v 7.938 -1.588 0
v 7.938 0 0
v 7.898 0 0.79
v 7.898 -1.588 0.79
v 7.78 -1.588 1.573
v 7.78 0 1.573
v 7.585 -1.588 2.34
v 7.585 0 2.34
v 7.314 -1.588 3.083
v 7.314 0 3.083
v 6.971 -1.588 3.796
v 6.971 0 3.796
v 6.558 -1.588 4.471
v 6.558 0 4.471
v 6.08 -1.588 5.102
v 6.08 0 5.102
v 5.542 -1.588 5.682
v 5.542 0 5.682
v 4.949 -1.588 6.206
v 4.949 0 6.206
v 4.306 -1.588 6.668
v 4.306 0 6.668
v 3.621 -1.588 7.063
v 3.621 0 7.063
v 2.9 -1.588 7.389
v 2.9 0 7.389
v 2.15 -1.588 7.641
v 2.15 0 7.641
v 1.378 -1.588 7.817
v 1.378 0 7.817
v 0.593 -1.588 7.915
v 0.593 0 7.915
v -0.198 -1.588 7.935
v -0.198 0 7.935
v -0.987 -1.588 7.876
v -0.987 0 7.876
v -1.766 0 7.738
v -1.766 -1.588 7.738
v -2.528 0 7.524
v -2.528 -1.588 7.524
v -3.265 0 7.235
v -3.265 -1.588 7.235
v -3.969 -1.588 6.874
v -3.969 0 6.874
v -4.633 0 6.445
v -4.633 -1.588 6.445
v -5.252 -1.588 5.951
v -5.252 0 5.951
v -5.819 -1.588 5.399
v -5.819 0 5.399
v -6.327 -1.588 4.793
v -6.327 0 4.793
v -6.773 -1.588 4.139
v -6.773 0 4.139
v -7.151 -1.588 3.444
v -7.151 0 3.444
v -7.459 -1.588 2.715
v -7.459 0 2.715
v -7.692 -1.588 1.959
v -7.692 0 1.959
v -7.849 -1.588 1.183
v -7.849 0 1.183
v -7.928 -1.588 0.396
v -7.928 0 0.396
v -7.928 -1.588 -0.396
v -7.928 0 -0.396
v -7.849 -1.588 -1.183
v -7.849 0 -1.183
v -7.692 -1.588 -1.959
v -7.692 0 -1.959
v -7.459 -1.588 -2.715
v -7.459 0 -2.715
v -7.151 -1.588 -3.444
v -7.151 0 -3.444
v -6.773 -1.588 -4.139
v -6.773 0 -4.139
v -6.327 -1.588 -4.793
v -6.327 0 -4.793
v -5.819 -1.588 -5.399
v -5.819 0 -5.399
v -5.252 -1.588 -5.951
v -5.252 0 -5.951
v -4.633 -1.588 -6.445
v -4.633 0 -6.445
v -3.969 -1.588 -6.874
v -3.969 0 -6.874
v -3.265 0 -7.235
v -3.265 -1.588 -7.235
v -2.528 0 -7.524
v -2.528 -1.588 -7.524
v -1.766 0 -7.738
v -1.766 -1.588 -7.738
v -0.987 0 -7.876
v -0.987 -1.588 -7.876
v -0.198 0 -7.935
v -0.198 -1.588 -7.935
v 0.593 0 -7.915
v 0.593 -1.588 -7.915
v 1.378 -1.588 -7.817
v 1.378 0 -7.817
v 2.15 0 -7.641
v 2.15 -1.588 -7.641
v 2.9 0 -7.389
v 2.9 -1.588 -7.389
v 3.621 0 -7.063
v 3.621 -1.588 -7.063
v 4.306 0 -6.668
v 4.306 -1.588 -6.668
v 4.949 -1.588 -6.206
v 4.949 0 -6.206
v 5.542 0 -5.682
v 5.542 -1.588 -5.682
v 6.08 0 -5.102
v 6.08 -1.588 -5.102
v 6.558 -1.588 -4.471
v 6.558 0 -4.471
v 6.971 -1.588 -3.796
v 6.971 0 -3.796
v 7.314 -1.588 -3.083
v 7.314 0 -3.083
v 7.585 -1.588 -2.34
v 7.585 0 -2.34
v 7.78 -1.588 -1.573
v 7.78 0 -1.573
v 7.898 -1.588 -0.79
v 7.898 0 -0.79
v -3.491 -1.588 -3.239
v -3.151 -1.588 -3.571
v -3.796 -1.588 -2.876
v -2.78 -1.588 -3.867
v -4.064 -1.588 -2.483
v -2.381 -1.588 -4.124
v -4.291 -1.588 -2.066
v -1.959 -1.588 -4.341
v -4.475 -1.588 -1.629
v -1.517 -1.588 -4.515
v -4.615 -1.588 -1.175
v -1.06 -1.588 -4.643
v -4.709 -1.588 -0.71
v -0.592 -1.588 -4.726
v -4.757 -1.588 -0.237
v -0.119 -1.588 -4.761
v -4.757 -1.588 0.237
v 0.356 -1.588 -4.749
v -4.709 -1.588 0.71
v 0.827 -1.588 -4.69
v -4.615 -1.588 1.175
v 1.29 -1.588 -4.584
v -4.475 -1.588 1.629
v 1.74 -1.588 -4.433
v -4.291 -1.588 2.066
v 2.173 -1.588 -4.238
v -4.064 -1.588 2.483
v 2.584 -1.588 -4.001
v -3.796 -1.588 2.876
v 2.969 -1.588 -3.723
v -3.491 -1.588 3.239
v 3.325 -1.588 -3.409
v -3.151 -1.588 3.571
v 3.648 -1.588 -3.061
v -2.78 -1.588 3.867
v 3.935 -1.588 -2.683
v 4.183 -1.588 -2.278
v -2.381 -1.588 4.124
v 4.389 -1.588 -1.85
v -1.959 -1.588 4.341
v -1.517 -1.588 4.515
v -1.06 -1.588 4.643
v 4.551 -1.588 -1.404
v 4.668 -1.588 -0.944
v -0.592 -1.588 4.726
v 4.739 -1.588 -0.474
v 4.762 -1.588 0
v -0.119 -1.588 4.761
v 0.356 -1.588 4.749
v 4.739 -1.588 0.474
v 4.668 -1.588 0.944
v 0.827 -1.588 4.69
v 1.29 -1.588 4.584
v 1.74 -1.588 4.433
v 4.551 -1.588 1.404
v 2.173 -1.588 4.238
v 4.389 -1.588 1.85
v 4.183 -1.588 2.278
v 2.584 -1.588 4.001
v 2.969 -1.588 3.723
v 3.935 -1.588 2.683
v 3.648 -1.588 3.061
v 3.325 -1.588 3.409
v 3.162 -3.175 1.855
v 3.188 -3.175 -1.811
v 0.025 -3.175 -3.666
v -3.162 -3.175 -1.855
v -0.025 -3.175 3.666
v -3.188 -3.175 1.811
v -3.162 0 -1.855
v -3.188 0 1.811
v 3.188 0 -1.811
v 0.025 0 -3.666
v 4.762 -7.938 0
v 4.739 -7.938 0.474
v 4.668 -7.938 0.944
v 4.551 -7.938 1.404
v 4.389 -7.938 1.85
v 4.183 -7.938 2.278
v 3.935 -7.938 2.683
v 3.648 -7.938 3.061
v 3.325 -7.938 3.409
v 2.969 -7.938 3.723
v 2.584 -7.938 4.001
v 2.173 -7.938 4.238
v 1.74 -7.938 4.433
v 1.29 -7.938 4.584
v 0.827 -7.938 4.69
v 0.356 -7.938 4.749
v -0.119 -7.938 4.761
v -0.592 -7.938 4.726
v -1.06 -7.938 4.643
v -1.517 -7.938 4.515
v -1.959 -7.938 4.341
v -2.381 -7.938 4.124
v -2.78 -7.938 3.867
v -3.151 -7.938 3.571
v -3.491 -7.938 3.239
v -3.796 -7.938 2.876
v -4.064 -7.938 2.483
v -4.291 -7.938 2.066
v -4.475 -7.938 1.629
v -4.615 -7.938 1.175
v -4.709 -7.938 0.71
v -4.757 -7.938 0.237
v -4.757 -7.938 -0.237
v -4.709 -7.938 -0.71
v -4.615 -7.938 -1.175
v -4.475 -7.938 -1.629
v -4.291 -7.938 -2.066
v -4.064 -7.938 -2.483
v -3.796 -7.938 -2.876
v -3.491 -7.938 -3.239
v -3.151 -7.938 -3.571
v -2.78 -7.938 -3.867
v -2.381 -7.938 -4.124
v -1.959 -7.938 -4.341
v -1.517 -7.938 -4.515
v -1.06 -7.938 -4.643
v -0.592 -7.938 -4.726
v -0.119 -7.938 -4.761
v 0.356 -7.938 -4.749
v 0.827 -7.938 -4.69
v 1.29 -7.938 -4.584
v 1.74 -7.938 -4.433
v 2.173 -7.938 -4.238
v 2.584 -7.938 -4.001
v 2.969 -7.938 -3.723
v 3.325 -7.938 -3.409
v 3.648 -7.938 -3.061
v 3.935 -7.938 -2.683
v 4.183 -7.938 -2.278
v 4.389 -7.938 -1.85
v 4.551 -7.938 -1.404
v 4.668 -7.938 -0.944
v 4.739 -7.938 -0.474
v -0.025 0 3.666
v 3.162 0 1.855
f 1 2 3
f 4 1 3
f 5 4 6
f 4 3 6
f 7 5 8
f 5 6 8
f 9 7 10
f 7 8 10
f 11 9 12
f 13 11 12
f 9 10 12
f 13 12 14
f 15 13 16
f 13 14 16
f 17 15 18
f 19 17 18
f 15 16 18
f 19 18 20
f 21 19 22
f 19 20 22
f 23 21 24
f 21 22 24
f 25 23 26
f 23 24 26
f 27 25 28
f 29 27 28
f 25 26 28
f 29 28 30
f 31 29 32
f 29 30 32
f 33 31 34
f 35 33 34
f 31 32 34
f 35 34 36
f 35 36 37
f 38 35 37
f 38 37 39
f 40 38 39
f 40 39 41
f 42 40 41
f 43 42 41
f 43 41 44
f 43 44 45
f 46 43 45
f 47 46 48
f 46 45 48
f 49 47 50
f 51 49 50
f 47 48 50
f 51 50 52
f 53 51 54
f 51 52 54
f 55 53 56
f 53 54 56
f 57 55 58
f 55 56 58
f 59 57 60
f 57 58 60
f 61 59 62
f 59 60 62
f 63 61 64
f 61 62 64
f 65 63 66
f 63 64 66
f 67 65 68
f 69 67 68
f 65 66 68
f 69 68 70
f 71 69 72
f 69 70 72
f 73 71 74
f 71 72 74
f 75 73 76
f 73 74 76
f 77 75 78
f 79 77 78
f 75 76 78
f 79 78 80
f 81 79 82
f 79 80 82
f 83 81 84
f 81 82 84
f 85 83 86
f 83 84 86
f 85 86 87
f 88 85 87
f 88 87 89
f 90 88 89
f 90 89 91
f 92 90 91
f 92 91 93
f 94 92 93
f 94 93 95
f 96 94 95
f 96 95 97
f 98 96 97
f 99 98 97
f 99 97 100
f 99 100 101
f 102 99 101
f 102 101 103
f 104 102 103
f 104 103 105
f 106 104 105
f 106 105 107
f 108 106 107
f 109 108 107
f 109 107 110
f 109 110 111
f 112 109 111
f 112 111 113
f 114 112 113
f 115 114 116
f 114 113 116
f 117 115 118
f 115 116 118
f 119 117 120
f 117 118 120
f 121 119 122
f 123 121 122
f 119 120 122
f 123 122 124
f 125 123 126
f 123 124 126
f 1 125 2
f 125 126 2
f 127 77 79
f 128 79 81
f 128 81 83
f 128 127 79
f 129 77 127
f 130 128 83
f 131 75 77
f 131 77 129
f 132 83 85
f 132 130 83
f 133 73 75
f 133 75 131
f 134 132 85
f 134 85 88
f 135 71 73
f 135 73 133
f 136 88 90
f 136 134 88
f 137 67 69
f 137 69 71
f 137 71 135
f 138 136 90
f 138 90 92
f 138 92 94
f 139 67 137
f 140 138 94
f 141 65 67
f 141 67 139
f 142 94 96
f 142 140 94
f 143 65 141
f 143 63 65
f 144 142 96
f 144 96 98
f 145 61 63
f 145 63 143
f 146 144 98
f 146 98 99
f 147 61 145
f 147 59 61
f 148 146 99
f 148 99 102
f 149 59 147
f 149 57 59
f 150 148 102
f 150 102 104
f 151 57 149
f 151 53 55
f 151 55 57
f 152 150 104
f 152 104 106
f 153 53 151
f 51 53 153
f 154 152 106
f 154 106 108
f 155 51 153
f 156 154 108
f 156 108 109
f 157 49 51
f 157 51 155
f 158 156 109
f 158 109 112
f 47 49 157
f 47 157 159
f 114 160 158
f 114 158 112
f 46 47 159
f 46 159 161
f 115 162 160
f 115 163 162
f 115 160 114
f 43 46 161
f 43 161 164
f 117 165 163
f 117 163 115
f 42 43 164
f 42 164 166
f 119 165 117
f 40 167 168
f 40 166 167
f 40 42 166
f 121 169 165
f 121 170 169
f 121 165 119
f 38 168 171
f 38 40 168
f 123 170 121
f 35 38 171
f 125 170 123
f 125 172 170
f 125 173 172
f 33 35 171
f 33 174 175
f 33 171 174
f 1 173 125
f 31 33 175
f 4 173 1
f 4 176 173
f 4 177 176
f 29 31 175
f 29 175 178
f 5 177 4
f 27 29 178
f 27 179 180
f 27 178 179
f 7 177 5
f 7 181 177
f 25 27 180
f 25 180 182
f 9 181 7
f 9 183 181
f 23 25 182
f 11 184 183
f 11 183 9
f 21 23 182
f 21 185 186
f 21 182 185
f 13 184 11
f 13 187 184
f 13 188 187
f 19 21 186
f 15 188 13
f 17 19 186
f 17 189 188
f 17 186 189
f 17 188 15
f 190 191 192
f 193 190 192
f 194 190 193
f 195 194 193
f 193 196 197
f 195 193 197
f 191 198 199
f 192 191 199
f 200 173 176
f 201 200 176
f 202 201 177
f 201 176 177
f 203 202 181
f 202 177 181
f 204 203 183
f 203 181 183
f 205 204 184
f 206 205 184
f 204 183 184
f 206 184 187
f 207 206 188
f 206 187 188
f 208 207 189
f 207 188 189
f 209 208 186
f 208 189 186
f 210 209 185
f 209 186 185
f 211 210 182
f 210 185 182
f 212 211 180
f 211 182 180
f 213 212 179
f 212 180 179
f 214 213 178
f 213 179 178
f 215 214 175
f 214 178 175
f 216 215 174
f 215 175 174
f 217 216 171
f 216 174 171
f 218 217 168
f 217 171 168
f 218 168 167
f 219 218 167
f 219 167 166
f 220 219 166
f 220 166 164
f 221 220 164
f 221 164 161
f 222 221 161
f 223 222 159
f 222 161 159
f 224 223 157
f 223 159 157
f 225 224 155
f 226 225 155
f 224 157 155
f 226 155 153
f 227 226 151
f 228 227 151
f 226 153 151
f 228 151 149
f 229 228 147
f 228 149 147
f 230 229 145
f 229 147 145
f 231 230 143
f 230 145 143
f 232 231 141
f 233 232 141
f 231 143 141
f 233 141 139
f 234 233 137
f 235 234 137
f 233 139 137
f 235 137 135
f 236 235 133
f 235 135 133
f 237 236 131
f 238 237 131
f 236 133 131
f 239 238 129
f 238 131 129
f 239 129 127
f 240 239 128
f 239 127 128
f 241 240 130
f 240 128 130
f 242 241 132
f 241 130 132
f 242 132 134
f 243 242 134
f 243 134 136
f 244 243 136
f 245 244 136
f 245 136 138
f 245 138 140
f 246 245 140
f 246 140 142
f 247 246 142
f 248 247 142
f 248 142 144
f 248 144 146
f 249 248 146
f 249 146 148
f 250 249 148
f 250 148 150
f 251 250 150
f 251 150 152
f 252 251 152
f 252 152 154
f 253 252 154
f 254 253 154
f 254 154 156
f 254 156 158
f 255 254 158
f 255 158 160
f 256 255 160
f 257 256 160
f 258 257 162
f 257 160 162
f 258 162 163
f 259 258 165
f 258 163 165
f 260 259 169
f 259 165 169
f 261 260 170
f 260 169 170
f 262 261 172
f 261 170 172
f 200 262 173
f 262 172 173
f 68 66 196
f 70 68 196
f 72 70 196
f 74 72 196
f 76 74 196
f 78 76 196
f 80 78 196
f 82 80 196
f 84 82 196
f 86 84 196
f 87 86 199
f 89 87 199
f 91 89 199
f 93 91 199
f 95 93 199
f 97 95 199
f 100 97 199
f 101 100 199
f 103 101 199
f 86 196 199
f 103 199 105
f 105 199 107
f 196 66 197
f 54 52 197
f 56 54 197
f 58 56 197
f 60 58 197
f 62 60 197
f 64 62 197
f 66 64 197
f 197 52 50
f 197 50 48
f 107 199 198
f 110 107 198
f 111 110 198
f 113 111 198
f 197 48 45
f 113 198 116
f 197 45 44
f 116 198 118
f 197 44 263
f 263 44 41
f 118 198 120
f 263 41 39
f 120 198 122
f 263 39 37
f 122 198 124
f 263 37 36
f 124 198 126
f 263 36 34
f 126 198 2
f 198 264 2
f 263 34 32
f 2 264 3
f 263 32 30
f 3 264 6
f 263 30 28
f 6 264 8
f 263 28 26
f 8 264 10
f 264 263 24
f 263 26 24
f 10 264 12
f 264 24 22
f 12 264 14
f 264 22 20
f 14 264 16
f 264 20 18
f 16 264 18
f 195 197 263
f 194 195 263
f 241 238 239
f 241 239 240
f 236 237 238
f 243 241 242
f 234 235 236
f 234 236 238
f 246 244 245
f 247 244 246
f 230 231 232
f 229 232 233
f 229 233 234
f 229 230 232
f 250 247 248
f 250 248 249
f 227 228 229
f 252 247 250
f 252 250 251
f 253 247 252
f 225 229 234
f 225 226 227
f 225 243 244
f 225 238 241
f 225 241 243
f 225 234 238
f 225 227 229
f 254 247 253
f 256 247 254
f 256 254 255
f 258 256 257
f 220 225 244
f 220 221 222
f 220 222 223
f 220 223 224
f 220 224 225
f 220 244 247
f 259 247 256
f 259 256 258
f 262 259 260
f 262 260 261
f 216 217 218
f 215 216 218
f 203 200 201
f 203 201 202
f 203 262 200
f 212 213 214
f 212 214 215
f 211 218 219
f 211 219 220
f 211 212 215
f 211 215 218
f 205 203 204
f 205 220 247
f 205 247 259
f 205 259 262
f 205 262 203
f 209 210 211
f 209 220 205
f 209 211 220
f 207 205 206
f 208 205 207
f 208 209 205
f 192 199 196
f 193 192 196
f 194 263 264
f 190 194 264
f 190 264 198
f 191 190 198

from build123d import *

# Parameters (mm, degrees)
F0_R     = 7.9375
F1_DEPTH = 1.5875
F2_R     = 4.7625
F3_DEPTH = 6.35
F5_DEPTH = 3.175


with BuildPart() as f1:
    # F0 (on Front) → F1 (new body)
    with BuildSketch(Plane.XZ):
        Circle(F0_R)
    extrude(amount=F1_DEPTH)

    # F2 (on face) → F3 (join)
    with BuildSketch(Plane.XZ.offset(1.5875)):
        Circle(F2_R)
    extrude(amount=F3_DEPTH)

    # F4 (on face) → F5 (cut)
    with BuildSketch(Plane(origin=(0, 0, 0), x_dir=(-1, 0, 0), z_dir=(0, 1, 0))):
        Polygon((3.187658, 1.810987), (0.025468, 3.666086), (-3.162189, 1.855099), (-3.187658, -1.810987), (-0.025468, -3.666086), (3.162189, -1.855099), align=None)
    extrude(amount=-F5_DEPTH, mode=Mode.SUBTRACT)


solid = f1.part
